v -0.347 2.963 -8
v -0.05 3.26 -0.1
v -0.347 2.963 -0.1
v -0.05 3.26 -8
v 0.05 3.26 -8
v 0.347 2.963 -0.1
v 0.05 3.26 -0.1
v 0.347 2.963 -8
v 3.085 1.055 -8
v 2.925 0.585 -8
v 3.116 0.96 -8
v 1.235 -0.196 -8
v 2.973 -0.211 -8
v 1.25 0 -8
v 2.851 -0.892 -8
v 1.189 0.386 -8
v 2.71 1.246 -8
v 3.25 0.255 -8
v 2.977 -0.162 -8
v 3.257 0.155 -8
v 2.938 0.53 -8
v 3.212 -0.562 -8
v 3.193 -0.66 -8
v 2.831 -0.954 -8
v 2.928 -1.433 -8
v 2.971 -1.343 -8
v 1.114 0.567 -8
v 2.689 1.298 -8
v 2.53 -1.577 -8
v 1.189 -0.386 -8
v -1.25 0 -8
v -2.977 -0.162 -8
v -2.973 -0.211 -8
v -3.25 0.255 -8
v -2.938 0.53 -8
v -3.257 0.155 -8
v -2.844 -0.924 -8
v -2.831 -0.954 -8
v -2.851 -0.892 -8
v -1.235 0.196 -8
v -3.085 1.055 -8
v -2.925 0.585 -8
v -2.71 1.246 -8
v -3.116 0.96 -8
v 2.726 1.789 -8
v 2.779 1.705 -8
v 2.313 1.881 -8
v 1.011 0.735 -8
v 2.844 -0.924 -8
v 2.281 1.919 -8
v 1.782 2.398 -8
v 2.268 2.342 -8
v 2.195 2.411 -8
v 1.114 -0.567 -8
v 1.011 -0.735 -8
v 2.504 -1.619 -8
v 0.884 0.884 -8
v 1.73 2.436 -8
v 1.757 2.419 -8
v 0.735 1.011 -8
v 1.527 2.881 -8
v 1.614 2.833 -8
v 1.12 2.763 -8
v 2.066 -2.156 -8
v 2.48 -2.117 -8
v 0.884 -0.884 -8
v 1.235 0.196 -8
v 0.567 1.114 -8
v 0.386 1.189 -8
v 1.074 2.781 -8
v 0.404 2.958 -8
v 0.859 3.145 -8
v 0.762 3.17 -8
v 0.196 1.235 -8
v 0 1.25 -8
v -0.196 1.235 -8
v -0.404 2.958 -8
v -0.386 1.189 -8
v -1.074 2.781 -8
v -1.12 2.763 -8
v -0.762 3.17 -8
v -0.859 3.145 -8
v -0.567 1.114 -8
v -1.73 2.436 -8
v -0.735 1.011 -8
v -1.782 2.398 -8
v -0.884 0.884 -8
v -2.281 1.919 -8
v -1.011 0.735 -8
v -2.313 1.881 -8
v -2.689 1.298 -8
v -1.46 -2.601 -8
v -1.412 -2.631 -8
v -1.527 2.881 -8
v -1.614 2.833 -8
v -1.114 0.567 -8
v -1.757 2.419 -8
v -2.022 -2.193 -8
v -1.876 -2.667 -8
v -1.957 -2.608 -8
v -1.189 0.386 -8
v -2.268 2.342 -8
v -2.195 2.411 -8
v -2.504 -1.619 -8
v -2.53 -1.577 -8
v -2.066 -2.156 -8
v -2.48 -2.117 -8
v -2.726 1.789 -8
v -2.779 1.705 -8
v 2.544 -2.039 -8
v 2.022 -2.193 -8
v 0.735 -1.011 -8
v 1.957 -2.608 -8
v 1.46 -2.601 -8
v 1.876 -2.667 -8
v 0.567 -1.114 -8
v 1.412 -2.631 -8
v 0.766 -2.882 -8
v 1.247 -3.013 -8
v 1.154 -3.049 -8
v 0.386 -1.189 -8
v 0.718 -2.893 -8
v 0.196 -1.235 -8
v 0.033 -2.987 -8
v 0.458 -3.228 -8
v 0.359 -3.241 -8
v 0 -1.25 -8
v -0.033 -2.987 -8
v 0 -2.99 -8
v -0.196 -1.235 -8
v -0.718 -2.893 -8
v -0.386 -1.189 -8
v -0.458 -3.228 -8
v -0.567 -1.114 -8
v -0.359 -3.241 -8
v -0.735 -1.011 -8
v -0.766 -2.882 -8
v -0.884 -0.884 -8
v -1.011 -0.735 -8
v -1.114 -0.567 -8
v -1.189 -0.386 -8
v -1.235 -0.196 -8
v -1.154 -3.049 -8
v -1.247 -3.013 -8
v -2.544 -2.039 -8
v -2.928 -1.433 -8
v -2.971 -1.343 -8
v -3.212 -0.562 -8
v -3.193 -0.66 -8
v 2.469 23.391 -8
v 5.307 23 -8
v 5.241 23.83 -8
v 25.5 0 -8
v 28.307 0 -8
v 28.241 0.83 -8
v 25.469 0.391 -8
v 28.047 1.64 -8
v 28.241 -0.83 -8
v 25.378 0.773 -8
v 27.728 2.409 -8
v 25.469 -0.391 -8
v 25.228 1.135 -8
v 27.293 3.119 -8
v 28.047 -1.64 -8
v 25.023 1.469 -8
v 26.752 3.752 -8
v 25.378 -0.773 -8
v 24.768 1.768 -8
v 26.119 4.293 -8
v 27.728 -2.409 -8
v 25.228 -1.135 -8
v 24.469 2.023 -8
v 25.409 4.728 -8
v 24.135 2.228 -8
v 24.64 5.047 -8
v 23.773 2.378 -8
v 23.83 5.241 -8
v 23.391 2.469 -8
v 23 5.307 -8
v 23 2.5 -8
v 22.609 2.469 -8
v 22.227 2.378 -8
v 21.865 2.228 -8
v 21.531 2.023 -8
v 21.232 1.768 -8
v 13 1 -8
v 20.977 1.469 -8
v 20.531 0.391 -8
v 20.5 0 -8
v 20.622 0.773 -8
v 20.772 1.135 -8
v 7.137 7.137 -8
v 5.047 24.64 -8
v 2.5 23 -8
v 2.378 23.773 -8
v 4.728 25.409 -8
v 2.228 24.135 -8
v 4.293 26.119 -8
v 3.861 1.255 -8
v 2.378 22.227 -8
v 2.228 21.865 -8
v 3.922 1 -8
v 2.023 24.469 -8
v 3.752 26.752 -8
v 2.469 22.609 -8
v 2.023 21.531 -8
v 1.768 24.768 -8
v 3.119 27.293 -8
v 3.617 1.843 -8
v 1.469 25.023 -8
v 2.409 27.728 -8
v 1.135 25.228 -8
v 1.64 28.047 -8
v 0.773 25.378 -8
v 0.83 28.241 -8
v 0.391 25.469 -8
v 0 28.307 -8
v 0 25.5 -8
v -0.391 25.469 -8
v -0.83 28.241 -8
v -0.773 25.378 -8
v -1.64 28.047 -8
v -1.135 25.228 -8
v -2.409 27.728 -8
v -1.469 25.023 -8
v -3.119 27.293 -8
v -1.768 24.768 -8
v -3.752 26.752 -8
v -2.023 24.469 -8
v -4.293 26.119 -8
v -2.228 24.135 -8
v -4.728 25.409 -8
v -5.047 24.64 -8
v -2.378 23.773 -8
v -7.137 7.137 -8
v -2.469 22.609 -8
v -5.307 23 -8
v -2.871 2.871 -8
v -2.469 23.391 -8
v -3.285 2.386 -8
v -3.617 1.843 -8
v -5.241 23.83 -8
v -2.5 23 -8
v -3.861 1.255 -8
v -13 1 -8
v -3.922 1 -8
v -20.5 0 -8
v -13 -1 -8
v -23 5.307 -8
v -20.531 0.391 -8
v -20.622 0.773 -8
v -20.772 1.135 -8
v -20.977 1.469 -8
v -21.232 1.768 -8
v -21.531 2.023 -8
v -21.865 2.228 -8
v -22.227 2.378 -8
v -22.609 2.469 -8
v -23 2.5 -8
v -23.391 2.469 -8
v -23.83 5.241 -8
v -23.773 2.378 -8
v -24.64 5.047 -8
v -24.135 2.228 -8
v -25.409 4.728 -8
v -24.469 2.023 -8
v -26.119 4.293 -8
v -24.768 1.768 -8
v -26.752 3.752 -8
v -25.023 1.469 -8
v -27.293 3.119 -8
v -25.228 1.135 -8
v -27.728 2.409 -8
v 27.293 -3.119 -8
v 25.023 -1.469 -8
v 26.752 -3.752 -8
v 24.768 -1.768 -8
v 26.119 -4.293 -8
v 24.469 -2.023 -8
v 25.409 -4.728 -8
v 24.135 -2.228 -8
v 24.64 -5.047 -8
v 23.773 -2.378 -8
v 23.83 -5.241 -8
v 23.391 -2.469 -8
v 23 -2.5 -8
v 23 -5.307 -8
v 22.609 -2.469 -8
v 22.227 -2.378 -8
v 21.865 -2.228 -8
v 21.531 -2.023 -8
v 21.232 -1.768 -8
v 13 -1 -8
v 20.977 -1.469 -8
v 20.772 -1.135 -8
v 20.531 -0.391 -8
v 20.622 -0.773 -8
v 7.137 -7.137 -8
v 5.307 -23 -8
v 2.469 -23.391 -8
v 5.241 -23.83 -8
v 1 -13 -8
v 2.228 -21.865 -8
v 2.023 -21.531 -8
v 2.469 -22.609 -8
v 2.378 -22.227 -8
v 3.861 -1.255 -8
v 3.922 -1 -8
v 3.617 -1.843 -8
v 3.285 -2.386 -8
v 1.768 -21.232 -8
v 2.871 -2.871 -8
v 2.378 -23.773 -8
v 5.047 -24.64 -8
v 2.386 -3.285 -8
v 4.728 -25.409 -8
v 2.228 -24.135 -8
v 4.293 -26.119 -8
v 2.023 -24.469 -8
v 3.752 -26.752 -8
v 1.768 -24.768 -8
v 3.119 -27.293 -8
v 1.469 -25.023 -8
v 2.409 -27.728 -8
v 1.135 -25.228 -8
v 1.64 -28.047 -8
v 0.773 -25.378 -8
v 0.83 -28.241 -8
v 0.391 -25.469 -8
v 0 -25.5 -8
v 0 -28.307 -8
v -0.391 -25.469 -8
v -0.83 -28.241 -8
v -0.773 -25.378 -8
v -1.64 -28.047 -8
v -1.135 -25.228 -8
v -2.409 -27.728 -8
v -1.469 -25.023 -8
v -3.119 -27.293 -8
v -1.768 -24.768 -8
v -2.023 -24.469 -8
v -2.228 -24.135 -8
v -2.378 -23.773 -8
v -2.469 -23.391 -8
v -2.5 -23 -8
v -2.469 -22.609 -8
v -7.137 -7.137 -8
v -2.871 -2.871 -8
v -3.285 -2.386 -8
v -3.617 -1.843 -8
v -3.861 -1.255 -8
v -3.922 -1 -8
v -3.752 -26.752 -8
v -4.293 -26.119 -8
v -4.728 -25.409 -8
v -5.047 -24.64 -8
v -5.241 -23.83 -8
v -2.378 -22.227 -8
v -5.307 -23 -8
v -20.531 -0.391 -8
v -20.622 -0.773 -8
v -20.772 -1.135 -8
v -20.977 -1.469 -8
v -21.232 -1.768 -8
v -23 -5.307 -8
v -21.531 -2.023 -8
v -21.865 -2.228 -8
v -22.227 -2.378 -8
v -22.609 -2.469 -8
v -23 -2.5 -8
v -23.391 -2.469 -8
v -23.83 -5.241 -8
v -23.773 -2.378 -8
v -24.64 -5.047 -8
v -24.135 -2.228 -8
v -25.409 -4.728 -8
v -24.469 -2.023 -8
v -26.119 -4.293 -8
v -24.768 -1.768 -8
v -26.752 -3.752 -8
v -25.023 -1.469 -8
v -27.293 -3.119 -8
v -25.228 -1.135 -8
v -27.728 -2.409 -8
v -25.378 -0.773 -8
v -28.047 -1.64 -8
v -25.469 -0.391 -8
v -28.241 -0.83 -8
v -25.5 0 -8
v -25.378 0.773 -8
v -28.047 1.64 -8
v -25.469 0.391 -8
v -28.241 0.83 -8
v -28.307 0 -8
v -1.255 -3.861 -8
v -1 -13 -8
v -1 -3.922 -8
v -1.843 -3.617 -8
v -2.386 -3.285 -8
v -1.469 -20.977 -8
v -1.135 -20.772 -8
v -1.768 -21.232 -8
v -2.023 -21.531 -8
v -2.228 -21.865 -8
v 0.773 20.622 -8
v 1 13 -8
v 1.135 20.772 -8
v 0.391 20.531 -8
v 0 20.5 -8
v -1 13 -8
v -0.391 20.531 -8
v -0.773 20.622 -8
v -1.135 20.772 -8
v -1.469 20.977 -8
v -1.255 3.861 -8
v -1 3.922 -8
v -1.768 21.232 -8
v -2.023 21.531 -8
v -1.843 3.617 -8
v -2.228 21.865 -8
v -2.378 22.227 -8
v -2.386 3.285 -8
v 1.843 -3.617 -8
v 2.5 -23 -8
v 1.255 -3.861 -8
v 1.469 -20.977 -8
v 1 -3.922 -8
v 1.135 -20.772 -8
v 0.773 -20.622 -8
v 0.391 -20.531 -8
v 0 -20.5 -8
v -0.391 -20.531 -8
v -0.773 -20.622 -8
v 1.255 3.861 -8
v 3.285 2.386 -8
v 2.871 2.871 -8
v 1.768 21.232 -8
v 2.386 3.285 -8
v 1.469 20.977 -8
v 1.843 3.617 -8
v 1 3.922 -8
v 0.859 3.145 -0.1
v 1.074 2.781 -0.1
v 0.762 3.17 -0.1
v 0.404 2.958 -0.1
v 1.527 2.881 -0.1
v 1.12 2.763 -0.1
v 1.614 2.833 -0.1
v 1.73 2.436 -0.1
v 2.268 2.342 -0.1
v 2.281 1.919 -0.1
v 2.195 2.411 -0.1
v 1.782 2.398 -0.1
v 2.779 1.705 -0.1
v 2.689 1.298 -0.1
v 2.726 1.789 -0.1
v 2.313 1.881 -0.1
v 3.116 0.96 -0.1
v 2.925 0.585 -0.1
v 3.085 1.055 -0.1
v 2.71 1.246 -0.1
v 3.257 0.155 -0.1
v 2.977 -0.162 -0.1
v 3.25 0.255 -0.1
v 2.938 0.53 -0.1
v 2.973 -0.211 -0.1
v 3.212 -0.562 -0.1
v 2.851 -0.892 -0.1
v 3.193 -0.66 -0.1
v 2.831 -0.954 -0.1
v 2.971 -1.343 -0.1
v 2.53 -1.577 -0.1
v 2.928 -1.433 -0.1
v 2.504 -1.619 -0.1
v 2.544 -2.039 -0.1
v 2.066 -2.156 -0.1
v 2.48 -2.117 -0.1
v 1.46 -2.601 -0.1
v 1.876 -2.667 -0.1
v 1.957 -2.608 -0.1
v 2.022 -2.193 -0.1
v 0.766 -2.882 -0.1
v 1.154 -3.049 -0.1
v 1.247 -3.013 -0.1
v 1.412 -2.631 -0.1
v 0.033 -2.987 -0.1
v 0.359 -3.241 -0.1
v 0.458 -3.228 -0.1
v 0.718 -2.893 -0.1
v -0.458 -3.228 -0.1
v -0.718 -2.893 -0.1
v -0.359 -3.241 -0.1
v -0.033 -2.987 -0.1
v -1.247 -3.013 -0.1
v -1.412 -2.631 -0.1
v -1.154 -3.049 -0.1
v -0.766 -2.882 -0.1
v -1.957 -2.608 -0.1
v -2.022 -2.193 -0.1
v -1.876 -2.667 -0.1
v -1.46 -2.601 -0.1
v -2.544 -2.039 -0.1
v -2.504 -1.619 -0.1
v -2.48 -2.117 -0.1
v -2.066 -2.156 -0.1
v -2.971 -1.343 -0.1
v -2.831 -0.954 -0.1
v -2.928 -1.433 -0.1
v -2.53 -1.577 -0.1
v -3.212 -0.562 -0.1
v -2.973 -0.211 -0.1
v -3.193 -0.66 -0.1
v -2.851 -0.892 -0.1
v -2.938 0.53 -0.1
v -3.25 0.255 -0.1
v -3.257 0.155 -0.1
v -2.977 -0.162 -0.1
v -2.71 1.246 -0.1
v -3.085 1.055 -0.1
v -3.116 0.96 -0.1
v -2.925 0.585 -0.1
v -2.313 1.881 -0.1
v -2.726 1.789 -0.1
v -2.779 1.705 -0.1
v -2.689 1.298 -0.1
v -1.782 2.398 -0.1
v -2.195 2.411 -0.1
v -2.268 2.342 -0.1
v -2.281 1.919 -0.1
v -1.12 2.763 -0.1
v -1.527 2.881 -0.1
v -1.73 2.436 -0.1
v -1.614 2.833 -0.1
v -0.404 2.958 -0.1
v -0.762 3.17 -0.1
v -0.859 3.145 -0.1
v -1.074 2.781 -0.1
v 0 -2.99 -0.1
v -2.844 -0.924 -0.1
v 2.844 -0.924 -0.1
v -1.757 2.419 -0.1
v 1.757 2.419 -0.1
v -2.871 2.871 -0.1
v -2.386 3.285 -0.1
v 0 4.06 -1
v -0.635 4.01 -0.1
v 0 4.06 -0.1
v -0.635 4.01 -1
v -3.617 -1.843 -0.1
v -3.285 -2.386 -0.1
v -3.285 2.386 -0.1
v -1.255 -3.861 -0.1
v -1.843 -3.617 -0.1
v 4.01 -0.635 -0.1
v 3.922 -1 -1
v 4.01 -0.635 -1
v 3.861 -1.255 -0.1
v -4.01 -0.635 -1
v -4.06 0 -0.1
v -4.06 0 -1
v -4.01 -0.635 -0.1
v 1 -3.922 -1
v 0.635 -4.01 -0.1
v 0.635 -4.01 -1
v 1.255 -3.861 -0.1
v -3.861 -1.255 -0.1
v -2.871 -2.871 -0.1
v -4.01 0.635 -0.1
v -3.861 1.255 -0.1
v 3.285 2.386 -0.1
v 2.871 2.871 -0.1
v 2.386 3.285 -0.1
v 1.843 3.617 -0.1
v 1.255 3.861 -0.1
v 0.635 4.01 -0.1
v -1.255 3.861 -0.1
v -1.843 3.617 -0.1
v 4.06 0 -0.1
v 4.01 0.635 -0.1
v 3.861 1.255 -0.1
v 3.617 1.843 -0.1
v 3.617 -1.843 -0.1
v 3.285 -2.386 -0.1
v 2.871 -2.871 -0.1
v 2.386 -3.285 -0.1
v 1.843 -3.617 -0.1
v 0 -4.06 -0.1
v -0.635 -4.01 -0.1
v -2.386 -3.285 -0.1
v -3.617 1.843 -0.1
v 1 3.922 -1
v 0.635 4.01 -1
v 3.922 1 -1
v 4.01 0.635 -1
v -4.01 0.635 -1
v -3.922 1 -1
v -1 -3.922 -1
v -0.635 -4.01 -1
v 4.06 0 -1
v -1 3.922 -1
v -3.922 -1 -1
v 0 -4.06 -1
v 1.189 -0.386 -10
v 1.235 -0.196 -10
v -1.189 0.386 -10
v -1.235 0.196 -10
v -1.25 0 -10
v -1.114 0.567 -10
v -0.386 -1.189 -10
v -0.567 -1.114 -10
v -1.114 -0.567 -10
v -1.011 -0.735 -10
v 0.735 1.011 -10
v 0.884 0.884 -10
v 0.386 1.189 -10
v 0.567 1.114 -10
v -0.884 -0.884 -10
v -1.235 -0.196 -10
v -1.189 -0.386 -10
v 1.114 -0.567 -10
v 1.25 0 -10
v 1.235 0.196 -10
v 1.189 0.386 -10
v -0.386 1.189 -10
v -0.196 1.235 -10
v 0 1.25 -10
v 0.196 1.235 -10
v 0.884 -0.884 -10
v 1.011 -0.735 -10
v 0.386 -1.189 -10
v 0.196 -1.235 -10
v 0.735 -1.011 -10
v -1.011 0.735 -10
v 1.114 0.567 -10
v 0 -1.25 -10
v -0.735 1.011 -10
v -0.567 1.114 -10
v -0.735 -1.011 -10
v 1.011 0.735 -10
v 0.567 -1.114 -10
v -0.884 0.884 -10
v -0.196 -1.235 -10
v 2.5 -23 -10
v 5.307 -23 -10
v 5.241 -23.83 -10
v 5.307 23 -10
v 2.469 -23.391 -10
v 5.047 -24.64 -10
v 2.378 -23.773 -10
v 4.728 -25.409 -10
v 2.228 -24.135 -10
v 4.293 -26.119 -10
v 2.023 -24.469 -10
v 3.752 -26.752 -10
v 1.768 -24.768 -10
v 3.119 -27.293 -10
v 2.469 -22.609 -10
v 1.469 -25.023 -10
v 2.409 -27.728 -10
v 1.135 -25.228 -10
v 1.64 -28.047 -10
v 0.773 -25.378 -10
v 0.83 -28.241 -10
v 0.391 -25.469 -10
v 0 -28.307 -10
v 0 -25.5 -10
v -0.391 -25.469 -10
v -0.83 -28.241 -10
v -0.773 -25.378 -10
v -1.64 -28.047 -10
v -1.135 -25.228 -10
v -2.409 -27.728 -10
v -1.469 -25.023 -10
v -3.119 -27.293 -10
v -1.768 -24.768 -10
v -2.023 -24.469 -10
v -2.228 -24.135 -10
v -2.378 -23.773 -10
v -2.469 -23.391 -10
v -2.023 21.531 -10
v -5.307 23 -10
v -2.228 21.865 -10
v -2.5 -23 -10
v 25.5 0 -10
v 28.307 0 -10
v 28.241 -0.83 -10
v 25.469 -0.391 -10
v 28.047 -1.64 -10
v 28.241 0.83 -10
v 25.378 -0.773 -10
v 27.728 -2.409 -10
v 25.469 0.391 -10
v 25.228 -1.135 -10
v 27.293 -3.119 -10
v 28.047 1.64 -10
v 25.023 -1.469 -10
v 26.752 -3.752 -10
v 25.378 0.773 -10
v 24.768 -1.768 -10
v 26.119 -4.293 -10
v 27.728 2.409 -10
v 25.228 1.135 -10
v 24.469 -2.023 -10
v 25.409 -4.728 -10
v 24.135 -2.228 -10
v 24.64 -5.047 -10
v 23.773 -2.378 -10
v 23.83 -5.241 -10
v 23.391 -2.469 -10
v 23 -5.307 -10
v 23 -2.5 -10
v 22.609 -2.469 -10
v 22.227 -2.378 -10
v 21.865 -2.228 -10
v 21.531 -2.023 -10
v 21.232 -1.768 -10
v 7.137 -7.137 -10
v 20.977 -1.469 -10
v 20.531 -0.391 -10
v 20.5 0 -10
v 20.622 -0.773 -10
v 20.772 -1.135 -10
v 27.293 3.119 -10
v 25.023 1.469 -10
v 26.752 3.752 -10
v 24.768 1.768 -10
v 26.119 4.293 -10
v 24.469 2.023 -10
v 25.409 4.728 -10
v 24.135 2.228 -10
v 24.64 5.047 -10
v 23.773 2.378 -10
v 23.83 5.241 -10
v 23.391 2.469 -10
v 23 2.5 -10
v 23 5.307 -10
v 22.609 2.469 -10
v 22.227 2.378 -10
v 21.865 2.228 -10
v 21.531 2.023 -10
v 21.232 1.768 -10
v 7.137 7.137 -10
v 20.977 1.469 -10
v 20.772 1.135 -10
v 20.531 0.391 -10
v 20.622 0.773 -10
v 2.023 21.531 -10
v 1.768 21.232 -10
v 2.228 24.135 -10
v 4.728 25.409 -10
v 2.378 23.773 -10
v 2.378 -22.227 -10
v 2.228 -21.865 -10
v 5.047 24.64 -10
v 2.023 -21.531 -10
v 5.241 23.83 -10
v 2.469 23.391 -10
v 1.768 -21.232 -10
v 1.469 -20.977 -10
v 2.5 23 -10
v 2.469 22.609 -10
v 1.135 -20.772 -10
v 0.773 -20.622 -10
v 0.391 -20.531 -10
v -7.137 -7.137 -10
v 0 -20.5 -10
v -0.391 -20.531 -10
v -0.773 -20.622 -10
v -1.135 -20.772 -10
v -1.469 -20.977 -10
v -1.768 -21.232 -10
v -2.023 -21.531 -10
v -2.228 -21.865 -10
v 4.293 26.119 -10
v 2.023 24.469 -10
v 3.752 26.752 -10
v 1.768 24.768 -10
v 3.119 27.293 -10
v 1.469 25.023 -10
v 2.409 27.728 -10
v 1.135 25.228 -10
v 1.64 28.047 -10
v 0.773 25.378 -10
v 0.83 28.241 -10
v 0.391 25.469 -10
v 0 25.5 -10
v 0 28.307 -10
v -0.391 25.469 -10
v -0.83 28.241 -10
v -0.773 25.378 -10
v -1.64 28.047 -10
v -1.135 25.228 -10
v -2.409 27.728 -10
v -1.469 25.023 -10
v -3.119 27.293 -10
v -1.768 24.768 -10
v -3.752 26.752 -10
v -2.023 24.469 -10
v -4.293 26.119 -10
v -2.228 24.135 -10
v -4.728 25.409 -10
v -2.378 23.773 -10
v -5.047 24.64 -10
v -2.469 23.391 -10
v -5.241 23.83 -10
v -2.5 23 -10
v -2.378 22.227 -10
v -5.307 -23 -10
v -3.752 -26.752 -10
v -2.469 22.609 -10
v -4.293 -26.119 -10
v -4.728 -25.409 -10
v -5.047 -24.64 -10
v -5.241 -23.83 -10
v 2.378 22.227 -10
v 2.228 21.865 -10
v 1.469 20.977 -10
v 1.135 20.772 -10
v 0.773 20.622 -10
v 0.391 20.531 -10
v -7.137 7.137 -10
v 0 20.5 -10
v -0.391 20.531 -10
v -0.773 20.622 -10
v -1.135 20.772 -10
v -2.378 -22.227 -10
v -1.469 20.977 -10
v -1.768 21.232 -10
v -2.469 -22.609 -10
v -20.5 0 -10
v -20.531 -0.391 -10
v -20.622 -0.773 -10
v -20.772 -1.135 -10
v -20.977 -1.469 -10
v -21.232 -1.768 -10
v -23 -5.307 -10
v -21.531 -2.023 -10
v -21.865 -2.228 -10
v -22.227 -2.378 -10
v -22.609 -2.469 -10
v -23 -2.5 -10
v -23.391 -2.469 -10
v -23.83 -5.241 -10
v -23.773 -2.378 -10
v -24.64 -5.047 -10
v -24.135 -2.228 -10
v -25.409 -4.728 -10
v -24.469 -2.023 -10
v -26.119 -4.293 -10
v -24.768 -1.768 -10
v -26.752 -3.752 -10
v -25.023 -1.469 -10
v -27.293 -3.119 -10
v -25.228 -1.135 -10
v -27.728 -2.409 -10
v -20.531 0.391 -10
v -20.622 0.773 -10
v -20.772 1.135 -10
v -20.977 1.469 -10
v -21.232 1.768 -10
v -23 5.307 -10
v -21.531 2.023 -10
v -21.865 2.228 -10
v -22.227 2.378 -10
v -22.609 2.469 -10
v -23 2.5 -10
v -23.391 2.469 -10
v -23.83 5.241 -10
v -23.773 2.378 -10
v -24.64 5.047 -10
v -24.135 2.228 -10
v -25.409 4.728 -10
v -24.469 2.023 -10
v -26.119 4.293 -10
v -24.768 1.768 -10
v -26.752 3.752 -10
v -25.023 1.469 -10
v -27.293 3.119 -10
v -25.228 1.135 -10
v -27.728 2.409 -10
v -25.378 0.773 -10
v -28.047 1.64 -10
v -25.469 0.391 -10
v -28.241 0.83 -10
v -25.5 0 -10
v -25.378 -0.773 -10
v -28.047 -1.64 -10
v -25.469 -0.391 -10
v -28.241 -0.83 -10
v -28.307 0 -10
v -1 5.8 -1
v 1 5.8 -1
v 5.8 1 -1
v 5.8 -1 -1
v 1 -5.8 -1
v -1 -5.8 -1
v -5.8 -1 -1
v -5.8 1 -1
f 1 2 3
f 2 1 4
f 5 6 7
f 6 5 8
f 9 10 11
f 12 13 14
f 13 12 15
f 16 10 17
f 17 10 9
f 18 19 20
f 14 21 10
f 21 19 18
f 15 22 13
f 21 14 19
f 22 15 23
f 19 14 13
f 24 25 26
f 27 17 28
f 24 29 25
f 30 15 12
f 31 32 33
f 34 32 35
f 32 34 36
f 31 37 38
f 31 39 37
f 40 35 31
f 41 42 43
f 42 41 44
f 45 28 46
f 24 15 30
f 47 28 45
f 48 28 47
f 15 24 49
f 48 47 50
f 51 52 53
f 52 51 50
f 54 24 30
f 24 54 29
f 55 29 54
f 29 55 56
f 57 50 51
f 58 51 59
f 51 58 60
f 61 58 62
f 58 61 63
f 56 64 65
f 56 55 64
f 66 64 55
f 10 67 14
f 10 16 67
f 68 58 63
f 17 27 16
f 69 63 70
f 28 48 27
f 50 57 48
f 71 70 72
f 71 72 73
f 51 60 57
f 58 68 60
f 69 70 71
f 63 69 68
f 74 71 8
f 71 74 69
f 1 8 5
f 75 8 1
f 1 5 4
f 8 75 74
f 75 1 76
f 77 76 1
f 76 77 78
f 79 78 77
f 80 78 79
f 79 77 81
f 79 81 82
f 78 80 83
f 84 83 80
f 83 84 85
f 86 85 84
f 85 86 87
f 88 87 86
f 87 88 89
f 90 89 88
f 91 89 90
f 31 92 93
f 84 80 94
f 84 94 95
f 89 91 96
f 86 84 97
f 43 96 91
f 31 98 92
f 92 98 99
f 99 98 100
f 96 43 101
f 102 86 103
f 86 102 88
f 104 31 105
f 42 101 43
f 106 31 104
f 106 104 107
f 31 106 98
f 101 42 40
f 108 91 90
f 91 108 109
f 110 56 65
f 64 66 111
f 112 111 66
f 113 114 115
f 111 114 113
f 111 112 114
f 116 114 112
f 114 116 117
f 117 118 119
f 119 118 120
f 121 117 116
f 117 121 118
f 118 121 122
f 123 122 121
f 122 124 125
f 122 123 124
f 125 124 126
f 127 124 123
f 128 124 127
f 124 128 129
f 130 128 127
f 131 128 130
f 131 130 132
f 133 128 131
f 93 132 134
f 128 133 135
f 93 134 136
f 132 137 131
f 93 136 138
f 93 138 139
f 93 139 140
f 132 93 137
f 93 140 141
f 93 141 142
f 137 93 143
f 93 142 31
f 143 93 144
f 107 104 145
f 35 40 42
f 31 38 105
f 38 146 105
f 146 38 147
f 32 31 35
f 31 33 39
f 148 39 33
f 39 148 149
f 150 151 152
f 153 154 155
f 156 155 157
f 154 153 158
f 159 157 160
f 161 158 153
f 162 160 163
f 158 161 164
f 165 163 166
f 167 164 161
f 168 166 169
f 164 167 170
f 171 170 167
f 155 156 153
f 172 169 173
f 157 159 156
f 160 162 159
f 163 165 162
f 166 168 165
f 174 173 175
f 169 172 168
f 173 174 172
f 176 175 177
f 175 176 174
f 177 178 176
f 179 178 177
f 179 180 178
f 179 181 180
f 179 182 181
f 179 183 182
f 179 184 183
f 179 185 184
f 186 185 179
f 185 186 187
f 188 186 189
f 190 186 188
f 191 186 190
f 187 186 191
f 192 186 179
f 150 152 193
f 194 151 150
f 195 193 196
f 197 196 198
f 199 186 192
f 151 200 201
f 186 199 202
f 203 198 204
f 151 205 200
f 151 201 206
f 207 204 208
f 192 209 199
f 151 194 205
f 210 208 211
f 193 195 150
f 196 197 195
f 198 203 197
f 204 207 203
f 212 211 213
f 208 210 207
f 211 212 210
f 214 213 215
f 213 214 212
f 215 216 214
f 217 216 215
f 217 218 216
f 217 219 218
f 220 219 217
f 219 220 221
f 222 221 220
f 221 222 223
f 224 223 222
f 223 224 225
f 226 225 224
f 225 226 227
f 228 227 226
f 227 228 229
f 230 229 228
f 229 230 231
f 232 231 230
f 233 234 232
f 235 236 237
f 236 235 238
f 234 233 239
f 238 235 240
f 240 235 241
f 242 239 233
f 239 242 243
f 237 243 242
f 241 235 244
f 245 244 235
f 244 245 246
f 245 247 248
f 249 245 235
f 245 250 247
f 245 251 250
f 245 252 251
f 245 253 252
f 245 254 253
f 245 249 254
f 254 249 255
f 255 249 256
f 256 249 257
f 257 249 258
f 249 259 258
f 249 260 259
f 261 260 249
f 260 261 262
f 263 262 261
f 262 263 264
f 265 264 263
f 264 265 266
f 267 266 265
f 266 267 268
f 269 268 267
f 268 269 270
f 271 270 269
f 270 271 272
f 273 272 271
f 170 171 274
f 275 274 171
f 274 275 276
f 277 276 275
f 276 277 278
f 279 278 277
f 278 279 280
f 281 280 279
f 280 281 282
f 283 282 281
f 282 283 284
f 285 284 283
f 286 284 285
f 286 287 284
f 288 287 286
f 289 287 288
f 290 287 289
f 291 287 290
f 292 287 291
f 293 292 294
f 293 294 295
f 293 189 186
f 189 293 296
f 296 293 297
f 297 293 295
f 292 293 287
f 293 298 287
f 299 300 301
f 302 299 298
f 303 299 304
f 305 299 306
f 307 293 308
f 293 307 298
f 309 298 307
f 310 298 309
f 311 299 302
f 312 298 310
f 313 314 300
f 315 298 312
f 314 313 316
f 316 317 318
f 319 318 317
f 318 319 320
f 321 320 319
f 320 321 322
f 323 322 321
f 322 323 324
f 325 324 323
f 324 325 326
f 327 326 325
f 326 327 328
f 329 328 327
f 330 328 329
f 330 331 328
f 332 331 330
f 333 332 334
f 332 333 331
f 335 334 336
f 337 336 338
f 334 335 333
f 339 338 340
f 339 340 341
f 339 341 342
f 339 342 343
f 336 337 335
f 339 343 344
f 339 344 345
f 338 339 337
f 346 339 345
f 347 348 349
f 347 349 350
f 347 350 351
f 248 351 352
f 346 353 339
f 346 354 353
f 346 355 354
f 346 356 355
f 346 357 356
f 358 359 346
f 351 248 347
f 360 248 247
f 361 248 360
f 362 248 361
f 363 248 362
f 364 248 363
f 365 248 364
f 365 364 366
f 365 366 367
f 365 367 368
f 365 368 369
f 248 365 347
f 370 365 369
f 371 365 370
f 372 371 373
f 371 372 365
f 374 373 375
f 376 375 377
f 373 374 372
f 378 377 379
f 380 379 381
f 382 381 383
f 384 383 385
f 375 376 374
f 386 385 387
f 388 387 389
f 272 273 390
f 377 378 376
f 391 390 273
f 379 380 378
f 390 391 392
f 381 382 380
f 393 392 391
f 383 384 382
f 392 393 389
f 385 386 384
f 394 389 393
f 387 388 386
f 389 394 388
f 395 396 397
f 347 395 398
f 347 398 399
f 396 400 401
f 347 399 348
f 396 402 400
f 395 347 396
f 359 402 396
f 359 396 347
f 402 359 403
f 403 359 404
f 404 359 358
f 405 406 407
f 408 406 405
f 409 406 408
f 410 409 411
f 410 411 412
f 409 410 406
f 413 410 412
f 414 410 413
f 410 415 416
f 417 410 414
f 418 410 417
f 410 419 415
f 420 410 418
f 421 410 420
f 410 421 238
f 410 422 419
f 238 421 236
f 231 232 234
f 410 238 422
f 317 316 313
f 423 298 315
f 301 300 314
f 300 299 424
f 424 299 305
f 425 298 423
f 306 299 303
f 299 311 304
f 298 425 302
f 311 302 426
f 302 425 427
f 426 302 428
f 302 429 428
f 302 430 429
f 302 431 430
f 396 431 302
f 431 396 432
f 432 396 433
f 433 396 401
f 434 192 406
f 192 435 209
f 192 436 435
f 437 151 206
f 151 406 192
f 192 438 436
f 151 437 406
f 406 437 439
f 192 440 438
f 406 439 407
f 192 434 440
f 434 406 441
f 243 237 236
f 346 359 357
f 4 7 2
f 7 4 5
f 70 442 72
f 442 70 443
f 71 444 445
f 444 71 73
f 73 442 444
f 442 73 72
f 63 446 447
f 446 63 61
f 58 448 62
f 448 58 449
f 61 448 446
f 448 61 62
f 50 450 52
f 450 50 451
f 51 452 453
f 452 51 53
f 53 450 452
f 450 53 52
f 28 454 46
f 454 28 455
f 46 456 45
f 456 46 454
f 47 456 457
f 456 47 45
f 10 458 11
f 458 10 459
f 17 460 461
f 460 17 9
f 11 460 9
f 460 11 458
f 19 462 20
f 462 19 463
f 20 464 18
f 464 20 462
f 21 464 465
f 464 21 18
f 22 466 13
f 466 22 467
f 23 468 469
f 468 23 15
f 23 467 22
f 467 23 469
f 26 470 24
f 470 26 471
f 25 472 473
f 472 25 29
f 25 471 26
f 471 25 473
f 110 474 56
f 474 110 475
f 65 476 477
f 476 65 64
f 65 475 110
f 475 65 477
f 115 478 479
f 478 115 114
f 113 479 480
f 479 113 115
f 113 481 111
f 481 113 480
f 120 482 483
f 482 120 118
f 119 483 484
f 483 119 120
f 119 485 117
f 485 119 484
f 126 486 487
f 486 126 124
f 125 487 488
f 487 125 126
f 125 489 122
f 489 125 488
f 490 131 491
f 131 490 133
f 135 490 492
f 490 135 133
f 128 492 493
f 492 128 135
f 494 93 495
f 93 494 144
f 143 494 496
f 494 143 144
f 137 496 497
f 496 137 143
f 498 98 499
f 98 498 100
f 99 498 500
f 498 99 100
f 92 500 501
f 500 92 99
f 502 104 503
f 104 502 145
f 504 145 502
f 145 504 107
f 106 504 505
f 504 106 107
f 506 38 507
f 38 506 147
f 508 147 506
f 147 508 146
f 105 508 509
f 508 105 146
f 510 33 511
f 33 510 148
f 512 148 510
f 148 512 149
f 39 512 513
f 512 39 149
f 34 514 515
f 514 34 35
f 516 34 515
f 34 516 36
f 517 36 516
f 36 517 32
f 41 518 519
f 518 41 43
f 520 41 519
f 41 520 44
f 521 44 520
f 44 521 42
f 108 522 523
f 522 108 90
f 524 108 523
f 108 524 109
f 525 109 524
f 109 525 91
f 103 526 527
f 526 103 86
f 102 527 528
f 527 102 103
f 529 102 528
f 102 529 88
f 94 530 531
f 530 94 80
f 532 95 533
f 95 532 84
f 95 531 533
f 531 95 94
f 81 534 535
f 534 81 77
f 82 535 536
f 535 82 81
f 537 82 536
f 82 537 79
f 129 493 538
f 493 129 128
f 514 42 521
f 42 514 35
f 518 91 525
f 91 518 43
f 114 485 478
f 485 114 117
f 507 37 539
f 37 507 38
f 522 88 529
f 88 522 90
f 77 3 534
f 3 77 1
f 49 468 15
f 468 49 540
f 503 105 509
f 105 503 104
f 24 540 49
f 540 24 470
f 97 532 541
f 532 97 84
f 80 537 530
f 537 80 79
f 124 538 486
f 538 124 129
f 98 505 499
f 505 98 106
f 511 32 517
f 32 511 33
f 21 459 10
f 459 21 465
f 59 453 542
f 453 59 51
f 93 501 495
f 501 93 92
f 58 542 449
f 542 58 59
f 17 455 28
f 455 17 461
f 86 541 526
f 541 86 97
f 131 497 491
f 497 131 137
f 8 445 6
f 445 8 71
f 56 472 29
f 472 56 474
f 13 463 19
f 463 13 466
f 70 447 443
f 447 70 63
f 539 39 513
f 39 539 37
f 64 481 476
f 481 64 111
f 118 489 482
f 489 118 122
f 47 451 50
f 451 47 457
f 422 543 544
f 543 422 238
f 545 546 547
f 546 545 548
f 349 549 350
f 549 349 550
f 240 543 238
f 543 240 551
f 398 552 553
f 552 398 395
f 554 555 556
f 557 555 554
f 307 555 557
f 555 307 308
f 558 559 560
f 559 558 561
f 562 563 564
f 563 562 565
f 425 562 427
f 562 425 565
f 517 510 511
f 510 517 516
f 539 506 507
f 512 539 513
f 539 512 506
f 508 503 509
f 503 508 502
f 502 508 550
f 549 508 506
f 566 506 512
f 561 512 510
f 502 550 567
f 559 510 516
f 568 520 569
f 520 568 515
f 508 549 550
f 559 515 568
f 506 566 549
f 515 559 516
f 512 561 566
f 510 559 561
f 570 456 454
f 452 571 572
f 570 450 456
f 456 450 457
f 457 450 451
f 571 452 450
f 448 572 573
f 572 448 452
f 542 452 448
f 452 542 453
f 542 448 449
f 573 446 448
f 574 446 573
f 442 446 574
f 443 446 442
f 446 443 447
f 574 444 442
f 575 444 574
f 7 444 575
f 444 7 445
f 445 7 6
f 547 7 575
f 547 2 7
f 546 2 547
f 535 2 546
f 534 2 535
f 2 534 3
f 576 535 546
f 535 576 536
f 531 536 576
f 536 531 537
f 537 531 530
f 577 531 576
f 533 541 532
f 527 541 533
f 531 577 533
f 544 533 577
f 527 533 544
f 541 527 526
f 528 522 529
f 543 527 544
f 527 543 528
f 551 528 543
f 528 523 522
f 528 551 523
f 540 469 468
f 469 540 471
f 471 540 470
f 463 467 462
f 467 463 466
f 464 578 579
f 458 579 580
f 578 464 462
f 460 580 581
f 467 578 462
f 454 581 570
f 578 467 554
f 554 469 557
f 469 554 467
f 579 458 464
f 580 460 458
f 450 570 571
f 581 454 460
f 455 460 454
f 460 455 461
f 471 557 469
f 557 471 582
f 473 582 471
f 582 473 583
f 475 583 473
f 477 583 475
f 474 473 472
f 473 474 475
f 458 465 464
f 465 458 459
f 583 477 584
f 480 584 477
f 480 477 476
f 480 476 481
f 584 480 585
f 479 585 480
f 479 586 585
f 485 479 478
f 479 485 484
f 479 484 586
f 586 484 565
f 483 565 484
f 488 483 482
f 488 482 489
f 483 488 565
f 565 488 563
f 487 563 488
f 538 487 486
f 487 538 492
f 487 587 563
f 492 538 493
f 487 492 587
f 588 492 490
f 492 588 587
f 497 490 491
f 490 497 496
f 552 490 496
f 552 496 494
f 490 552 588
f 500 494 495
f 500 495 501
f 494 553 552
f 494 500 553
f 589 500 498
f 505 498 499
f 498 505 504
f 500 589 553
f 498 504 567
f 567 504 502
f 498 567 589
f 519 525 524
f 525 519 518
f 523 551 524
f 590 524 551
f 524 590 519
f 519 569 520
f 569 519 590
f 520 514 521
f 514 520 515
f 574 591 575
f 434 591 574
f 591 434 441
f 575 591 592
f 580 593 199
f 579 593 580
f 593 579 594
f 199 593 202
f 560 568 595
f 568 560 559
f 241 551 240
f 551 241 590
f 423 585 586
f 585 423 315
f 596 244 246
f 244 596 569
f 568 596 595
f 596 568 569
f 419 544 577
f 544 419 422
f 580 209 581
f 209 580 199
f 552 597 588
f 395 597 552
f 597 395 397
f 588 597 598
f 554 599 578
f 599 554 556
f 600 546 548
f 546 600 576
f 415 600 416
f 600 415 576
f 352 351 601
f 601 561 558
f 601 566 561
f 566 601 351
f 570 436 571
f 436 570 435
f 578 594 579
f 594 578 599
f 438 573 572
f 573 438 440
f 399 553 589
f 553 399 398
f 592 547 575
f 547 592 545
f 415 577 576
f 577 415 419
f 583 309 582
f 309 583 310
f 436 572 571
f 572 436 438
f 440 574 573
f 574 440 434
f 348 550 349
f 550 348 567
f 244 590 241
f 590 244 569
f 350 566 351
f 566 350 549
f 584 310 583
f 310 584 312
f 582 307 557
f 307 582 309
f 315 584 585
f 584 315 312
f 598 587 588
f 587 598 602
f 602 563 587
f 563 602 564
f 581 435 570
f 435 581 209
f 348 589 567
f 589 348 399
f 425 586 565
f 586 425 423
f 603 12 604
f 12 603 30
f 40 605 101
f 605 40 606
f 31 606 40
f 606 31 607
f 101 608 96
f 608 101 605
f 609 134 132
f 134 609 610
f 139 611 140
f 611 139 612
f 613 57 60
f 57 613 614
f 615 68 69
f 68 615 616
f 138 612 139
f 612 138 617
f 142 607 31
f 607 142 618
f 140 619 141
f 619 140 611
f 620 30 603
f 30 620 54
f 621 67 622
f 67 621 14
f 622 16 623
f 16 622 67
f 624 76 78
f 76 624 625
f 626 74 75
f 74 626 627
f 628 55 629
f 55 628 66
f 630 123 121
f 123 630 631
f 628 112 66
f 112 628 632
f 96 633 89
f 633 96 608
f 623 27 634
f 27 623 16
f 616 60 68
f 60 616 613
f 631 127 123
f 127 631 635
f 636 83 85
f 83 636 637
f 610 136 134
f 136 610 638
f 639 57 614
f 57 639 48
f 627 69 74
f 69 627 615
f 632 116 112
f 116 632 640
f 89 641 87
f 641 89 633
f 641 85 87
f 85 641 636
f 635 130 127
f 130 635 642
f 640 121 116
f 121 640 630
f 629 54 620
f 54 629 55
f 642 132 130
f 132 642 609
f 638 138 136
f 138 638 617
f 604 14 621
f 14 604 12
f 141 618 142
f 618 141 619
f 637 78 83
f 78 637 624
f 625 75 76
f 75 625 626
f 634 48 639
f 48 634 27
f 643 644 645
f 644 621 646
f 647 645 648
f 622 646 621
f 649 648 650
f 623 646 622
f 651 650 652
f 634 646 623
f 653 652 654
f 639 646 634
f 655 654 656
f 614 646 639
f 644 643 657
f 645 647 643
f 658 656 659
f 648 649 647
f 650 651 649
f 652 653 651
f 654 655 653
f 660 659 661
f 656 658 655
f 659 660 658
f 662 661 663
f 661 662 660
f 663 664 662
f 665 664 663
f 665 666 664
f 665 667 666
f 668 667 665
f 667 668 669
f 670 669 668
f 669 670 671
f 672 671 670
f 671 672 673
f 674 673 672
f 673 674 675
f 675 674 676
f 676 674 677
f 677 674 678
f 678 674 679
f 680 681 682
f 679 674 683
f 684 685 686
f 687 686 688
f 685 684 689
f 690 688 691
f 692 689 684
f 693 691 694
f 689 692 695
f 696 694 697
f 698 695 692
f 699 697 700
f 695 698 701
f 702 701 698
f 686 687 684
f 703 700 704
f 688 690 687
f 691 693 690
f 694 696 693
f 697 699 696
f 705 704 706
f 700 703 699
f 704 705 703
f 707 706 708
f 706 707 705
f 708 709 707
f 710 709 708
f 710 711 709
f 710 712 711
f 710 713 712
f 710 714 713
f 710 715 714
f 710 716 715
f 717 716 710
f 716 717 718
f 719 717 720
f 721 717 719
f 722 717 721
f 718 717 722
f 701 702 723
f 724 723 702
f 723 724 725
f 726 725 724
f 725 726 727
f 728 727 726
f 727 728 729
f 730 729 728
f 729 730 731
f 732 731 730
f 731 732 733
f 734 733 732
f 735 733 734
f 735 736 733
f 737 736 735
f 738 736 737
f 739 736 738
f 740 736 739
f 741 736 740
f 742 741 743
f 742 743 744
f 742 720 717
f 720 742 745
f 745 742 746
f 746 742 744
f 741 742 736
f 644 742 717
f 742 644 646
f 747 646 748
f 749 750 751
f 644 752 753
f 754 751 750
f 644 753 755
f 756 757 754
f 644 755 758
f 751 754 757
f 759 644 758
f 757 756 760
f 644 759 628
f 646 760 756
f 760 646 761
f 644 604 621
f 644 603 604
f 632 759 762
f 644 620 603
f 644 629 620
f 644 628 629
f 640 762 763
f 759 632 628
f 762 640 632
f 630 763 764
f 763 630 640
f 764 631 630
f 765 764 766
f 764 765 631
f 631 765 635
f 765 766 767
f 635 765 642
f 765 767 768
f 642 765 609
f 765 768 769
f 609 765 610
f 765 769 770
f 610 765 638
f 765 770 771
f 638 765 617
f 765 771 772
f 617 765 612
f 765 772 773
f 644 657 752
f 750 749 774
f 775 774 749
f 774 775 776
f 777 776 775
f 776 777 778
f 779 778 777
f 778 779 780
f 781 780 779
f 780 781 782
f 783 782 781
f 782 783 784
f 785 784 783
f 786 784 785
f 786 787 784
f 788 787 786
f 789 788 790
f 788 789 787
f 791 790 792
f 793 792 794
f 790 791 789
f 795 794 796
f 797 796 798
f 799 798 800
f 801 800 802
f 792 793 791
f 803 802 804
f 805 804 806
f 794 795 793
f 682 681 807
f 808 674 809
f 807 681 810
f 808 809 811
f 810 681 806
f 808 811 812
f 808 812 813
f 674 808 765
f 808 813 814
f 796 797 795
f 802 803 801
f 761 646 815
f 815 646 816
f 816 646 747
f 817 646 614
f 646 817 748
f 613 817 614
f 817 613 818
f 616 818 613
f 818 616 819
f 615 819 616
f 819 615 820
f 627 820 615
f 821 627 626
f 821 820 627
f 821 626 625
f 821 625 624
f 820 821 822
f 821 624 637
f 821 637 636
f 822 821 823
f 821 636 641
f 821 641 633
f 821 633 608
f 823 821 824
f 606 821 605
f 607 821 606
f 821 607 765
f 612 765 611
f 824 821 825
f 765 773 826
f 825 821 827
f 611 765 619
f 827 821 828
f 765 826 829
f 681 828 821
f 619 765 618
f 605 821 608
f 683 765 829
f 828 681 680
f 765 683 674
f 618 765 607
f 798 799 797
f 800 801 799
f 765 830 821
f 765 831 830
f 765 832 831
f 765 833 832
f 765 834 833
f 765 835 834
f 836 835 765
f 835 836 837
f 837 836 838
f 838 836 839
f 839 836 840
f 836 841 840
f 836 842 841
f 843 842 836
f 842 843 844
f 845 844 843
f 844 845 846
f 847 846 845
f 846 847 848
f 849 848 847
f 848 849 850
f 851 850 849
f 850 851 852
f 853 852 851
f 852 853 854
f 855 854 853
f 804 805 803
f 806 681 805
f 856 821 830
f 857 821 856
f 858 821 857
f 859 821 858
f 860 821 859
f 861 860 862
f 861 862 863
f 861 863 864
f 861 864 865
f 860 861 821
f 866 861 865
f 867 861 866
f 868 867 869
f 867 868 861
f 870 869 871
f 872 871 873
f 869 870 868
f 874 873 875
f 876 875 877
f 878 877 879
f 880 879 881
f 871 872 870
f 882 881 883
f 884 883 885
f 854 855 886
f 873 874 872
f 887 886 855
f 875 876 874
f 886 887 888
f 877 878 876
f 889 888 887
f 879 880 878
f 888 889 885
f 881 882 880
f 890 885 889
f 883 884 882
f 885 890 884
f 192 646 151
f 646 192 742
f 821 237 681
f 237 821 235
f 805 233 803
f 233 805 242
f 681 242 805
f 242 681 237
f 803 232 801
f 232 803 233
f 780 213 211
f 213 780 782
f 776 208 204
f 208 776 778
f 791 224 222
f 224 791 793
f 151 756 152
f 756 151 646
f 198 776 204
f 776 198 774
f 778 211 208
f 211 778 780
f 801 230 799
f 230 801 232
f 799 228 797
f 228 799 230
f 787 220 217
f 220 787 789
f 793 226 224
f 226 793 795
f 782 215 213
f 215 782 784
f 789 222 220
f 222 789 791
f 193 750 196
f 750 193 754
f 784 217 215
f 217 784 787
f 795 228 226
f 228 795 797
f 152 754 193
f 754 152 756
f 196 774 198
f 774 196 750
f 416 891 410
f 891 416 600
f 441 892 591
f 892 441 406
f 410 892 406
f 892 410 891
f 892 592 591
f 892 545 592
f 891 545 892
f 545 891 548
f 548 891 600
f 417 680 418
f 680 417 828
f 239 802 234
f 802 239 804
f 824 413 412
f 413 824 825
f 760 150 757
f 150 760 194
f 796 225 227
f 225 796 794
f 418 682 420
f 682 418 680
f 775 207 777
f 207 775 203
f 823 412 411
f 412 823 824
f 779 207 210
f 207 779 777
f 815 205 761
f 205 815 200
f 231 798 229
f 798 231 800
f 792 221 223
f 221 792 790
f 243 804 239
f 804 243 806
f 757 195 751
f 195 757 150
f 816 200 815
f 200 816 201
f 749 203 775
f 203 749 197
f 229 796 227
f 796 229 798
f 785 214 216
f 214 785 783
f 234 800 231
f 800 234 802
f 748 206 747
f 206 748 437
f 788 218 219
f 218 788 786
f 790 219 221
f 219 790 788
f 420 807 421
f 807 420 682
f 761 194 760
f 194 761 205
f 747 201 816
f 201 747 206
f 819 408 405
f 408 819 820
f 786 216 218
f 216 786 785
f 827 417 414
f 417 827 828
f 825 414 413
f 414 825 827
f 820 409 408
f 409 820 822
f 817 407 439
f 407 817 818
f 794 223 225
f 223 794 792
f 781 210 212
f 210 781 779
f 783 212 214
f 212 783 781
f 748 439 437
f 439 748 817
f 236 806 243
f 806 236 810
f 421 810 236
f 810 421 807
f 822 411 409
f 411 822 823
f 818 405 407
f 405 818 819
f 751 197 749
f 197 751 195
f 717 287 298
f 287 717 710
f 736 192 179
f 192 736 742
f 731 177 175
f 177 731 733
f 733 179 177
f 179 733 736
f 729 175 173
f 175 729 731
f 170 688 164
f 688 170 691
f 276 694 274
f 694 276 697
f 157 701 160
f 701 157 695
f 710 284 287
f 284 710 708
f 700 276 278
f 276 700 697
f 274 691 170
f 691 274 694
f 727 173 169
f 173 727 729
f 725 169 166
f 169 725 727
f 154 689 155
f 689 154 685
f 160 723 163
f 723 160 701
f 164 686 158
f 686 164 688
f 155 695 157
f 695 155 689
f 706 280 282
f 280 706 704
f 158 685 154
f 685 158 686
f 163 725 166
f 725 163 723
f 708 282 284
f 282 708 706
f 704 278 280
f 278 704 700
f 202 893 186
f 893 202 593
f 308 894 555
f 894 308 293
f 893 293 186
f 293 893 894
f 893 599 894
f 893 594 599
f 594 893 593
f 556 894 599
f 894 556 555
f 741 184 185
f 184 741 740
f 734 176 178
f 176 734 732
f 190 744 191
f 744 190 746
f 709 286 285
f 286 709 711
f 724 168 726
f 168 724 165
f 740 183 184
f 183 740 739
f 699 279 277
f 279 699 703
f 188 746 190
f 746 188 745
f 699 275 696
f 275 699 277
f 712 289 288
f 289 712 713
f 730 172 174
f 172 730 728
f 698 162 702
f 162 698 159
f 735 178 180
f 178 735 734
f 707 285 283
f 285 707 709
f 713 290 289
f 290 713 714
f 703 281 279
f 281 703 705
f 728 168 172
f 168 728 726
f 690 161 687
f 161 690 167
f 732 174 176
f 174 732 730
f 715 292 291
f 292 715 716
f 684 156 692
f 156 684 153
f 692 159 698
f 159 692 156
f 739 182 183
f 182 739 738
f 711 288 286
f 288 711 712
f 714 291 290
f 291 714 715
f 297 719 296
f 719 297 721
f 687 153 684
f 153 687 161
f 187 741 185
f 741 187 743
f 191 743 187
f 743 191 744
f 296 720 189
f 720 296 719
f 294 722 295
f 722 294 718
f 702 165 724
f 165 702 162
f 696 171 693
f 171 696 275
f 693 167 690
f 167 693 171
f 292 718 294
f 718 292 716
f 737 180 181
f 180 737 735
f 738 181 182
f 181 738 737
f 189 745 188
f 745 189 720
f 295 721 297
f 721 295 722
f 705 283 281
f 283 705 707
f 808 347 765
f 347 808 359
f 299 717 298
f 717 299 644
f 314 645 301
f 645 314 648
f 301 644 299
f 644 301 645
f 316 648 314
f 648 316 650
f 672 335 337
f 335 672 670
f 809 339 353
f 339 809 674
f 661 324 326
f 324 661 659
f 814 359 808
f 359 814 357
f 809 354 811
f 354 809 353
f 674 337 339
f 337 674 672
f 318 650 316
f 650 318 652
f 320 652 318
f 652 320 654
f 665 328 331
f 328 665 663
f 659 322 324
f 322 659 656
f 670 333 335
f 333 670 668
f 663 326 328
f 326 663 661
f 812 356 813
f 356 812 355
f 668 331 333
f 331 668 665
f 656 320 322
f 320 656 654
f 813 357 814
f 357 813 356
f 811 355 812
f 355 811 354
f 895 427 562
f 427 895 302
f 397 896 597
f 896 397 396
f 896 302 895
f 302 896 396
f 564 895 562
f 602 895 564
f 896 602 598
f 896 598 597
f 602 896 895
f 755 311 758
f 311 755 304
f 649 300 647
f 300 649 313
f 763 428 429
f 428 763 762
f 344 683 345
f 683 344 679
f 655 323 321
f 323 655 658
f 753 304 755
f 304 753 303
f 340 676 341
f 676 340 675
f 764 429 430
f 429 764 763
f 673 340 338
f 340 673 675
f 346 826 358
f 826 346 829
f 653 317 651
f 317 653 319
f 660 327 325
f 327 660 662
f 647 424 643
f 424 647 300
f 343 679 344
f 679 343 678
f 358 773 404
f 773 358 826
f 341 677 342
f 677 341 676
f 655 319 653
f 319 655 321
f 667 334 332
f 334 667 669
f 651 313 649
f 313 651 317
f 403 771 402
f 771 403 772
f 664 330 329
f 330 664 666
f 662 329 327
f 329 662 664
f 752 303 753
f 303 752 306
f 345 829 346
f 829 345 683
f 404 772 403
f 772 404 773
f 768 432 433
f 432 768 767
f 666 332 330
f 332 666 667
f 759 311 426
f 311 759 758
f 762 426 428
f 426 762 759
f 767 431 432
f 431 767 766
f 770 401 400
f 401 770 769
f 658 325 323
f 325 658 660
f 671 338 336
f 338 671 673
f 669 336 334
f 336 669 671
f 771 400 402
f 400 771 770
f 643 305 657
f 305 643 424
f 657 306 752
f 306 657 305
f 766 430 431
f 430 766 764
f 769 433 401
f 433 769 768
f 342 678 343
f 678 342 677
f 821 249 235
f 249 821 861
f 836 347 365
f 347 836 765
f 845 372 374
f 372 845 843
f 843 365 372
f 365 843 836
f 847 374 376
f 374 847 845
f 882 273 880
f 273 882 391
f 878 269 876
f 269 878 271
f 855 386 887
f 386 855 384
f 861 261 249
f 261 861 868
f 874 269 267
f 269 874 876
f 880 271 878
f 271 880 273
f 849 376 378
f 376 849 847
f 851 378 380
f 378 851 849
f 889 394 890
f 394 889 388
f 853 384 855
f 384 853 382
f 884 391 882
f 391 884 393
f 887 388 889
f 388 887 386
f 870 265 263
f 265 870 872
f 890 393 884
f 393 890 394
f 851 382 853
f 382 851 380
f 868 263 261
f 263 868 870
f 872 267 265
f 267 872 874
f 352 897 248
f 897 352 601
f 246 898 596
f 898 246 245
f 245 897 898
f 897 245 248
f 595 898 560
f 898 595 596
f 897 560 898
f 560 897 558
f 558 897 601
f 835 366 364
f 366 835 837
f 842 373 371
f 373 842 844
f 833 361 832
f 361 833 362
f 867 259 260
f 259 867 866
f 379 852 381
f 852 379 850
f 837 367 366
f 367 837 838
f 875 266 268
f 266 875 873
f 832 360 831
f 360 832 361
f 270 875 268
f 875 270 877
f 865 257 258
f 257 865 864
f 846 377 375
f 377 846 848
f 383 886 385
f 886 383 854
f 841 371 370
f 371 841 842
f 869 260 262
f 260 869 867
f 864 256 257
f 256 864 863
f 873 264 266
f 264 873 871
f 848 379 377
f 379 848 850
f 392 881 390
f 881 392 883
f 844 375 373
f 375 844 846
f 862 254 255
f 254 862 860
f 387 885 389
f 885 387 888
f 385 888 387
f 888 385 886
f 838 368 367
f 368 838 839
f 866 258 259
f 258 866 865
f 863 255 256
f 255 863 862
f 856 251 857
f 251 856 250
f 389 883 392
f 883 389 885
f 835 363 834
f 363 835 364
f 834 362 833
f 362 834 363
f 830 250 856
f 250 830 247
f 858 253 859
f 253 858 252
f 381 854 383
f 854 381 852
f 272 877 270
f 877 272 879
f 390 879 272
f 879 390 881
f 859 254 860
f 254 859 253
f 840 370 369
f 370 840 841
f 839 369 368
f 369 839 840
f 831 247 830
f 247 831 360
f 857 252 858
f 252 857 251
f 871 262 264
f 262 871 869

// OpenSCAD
/**
 *  Parametric servo arm generator for OpenScad
 *  Générateur de palonnier de servo pour OpenScad
 *
 *  Copyright (c) 2012 Charles Rincheval.  All rights reserved.
 *
 *  This library is free software; you can redistribute it and/or
 *  modify it under the terms of the GNU Lesser General Public
 *  License as published by the Free Software Foundation; either
 *  version 2.1 of the License, or (at your option) any later version.
 *
 *  This library is distributed in the hope that it will be useful,
 *  but WITHOUT ANY WARRANTY; without even the implied warranty of
 *  MERCHANTABILITY or FITNESS FOR A PARTICULAR PURPOSE.  See the GNU
 *  Lesser General Public License for more details.
 *
 *  You should have received a copy of the GNU Lesser General Public
 *  License along with this library; if not, write to the Free Software
 *  Foundation, Inc., 51 Franklin St, Fifth Floor, Boston, MA  02110-1301  USA
 *
 *  Last update :
 *  https://github.com/hugokernel/OpenSCAD_ServoArms
 *
 *  http://www.digitalspirit.org/
 */

$fn = 40;

/**
 *  Clear between arm head and servo head
 *  With PLA material, use clear : 0.3, for ABS, use 0.2
 */
SERVO_HEAD_CLEAR = 0.3;
arm_screw_diameter = 5;
arm_thickness = 5;
/**
 *  Head / Tooth parameters
 *  Futaba 3F Standard Spline
 *  http://www.servocity.com/html/futaba_servo_splines.html
 *
 *  First array (head related) :
 *  0. Head external diameter
 *  1. Head heigth
 *  2. Head thickness
 *  3. Head screw diameter
 *
 *  Second array (tooth related) :
 *  0. Tooth count
 *  1. Tooth height
 *  2. Tooth length
 *  3. Tooth width
 */
FUTABA_3F_SPLINE = [
    [5.92, 8, 1.1, 2.5],
    [25, 0.3, 0.7, 0.1]
];

module servo_futaba_3f(length, count) {
    servo_arm(FUTABA_3F_SPLINE, [length, count]);
}

/**
 *  If you want to support a new servo, juste add a new spline definition array
 *  and a module named like servo_XXX_YYY where XXX is servo brand and YYY is the
 *  connection type (3f) or the servo type (s3003)
 */

module servo_standard(length, count) {
    servo_futaba_3f(length, count);
}

/**
 *  Tooth
 *
 *    |<-w->|
 *    |_____|___
 *    /     \  ^h
 *  _/       \_v
 *   |<--l-->|
 *
 *  - tooth length (l)
 *  - tooth width (w)
 *  - tooth height (h)
 *  - height
 *
 */
module servo_head_tooth(length, width, height, head_height) {
    linear_extrude(height = head_height) {
        polygon([[-length / 2, 0], [-width / 2, height], [width / 2, height], [length / 2,0]]);
    }
}

/**
 *  Servo head
 */
module servo_head(params, clear = SERVO_HEAD_CLEAR) {

    head = params[0];
    tooth = params[1];

    head_diameter = head[0];
    head_heigth = head[1];

    tooth_count = tooth[0];
    tooth_height = tooth[1];
    tooth_length = tooth[2];
    tooth_width = tooth[3];

    % cylinder(r = head_diameter / 2, h = head_heigth + 1);

    cylinder(r = head_diameter / 2 - tooth_height + 0.03 + clear, h = head_heigth);

    for (i = [0 : tooth_count]) {
        rotate([0, 0, i * (360 / tooth_count)]) {
            translate([0, head_diameter / 2 - tooth_height + clear, 0]) {
                servo_head_tooth(tooth_length, tooth_width, tooth_height, head_heigth);
            }
        }
    }
}

/**
 *  Servo hold
 *  - Head / Tooth parameters
 *  - Arms params (length and count)
 */
module servo_arm(params, arms) {

    head = params[0];
    tooth = params[1];

    head_diameter = head[0];
    head_heigth = head[1];
    head_thickness = head[2];
    head_screw_diameter = head[3];

    tooth_length = tooth[2];
    tooth_width = tooth[3];

    arm_length = arms[0];
    arm_count = arms[1];

    /**
     *  Servo arm
     *  - length is from center to last hole
     */
    module arm(tooth_length, tooth_width, head_height, head_heigth, hole_count = 1) {

        //arm_screw_diameter = 5;

        difference() {
            union() {
                cylinder(r = tooth_width / 2, h = head_heigth);

                linear_extrude(height = head_heigth) {
                    polygon([
                        [-tooth_width / 2, 0], [-tooth_width / 3, tooth_length],
                        [tooth_width / 3, tooth_length], [tooth_width / 2, 0]
                    ]);
                }

                translate([0, tooth_length, 0]) {
                    cylinder(r = tooth_width / 3, h = head_heigth);
                }

                if (tooth_length >= 12) {
                    translate([-head_heigth / 2 + 2, 3.8, -4]) {
                        rotate([90, 0, 0]) {
                            rotate([0, -90, 0])
											//Support for the center hole
										 {
                                linear_extrude(height = head_heigth) {
                                    polygon([
                                        [-tooth_length / 2.5, 4], [0, 4], [0, - head_height + 5],
                                        [-2, - head_height + 5]
                                    ]);
                                }
                            }
                        }
                    }
                }
            }

            // Hole
            for (i = [0 : hole_count - 1]) {
                //translate([0, length - (length / hole_count * i), -1]) {
                translate([0, tooth_length - (4 * i), -1]) {
                    cylinder(r = arm_screw_diameter / 2, h = 10);
                }
            }

            cylinder(r = head_screw_diameter / 2, h = 10);
        }
    }

    difference() {
        translate([0, 0, 0.1]) {
            cylinder(r = head_diameter / 2 + head_thickness, h = head_heigth + 1);
        }

        cylinder(r = head_screw_diameter / 2, h = 10);

        servo_head(params);
    }

    //arm_thickness = head_thickness;

    // Arm
    translate([0, 0, head_heigth]) {
        for (i = [0 : arm_count - 1]) {
            rotate([0, 0, i * (360 / arm_count)]) {
                arm(arm_length, head_diameter + arm_thickness * 2, head_heigth, 2);
            }
        }
    }
}

module demo() {
    rotate([0, 180, 0])
        servo_standard(23, 4);
}

demo();
